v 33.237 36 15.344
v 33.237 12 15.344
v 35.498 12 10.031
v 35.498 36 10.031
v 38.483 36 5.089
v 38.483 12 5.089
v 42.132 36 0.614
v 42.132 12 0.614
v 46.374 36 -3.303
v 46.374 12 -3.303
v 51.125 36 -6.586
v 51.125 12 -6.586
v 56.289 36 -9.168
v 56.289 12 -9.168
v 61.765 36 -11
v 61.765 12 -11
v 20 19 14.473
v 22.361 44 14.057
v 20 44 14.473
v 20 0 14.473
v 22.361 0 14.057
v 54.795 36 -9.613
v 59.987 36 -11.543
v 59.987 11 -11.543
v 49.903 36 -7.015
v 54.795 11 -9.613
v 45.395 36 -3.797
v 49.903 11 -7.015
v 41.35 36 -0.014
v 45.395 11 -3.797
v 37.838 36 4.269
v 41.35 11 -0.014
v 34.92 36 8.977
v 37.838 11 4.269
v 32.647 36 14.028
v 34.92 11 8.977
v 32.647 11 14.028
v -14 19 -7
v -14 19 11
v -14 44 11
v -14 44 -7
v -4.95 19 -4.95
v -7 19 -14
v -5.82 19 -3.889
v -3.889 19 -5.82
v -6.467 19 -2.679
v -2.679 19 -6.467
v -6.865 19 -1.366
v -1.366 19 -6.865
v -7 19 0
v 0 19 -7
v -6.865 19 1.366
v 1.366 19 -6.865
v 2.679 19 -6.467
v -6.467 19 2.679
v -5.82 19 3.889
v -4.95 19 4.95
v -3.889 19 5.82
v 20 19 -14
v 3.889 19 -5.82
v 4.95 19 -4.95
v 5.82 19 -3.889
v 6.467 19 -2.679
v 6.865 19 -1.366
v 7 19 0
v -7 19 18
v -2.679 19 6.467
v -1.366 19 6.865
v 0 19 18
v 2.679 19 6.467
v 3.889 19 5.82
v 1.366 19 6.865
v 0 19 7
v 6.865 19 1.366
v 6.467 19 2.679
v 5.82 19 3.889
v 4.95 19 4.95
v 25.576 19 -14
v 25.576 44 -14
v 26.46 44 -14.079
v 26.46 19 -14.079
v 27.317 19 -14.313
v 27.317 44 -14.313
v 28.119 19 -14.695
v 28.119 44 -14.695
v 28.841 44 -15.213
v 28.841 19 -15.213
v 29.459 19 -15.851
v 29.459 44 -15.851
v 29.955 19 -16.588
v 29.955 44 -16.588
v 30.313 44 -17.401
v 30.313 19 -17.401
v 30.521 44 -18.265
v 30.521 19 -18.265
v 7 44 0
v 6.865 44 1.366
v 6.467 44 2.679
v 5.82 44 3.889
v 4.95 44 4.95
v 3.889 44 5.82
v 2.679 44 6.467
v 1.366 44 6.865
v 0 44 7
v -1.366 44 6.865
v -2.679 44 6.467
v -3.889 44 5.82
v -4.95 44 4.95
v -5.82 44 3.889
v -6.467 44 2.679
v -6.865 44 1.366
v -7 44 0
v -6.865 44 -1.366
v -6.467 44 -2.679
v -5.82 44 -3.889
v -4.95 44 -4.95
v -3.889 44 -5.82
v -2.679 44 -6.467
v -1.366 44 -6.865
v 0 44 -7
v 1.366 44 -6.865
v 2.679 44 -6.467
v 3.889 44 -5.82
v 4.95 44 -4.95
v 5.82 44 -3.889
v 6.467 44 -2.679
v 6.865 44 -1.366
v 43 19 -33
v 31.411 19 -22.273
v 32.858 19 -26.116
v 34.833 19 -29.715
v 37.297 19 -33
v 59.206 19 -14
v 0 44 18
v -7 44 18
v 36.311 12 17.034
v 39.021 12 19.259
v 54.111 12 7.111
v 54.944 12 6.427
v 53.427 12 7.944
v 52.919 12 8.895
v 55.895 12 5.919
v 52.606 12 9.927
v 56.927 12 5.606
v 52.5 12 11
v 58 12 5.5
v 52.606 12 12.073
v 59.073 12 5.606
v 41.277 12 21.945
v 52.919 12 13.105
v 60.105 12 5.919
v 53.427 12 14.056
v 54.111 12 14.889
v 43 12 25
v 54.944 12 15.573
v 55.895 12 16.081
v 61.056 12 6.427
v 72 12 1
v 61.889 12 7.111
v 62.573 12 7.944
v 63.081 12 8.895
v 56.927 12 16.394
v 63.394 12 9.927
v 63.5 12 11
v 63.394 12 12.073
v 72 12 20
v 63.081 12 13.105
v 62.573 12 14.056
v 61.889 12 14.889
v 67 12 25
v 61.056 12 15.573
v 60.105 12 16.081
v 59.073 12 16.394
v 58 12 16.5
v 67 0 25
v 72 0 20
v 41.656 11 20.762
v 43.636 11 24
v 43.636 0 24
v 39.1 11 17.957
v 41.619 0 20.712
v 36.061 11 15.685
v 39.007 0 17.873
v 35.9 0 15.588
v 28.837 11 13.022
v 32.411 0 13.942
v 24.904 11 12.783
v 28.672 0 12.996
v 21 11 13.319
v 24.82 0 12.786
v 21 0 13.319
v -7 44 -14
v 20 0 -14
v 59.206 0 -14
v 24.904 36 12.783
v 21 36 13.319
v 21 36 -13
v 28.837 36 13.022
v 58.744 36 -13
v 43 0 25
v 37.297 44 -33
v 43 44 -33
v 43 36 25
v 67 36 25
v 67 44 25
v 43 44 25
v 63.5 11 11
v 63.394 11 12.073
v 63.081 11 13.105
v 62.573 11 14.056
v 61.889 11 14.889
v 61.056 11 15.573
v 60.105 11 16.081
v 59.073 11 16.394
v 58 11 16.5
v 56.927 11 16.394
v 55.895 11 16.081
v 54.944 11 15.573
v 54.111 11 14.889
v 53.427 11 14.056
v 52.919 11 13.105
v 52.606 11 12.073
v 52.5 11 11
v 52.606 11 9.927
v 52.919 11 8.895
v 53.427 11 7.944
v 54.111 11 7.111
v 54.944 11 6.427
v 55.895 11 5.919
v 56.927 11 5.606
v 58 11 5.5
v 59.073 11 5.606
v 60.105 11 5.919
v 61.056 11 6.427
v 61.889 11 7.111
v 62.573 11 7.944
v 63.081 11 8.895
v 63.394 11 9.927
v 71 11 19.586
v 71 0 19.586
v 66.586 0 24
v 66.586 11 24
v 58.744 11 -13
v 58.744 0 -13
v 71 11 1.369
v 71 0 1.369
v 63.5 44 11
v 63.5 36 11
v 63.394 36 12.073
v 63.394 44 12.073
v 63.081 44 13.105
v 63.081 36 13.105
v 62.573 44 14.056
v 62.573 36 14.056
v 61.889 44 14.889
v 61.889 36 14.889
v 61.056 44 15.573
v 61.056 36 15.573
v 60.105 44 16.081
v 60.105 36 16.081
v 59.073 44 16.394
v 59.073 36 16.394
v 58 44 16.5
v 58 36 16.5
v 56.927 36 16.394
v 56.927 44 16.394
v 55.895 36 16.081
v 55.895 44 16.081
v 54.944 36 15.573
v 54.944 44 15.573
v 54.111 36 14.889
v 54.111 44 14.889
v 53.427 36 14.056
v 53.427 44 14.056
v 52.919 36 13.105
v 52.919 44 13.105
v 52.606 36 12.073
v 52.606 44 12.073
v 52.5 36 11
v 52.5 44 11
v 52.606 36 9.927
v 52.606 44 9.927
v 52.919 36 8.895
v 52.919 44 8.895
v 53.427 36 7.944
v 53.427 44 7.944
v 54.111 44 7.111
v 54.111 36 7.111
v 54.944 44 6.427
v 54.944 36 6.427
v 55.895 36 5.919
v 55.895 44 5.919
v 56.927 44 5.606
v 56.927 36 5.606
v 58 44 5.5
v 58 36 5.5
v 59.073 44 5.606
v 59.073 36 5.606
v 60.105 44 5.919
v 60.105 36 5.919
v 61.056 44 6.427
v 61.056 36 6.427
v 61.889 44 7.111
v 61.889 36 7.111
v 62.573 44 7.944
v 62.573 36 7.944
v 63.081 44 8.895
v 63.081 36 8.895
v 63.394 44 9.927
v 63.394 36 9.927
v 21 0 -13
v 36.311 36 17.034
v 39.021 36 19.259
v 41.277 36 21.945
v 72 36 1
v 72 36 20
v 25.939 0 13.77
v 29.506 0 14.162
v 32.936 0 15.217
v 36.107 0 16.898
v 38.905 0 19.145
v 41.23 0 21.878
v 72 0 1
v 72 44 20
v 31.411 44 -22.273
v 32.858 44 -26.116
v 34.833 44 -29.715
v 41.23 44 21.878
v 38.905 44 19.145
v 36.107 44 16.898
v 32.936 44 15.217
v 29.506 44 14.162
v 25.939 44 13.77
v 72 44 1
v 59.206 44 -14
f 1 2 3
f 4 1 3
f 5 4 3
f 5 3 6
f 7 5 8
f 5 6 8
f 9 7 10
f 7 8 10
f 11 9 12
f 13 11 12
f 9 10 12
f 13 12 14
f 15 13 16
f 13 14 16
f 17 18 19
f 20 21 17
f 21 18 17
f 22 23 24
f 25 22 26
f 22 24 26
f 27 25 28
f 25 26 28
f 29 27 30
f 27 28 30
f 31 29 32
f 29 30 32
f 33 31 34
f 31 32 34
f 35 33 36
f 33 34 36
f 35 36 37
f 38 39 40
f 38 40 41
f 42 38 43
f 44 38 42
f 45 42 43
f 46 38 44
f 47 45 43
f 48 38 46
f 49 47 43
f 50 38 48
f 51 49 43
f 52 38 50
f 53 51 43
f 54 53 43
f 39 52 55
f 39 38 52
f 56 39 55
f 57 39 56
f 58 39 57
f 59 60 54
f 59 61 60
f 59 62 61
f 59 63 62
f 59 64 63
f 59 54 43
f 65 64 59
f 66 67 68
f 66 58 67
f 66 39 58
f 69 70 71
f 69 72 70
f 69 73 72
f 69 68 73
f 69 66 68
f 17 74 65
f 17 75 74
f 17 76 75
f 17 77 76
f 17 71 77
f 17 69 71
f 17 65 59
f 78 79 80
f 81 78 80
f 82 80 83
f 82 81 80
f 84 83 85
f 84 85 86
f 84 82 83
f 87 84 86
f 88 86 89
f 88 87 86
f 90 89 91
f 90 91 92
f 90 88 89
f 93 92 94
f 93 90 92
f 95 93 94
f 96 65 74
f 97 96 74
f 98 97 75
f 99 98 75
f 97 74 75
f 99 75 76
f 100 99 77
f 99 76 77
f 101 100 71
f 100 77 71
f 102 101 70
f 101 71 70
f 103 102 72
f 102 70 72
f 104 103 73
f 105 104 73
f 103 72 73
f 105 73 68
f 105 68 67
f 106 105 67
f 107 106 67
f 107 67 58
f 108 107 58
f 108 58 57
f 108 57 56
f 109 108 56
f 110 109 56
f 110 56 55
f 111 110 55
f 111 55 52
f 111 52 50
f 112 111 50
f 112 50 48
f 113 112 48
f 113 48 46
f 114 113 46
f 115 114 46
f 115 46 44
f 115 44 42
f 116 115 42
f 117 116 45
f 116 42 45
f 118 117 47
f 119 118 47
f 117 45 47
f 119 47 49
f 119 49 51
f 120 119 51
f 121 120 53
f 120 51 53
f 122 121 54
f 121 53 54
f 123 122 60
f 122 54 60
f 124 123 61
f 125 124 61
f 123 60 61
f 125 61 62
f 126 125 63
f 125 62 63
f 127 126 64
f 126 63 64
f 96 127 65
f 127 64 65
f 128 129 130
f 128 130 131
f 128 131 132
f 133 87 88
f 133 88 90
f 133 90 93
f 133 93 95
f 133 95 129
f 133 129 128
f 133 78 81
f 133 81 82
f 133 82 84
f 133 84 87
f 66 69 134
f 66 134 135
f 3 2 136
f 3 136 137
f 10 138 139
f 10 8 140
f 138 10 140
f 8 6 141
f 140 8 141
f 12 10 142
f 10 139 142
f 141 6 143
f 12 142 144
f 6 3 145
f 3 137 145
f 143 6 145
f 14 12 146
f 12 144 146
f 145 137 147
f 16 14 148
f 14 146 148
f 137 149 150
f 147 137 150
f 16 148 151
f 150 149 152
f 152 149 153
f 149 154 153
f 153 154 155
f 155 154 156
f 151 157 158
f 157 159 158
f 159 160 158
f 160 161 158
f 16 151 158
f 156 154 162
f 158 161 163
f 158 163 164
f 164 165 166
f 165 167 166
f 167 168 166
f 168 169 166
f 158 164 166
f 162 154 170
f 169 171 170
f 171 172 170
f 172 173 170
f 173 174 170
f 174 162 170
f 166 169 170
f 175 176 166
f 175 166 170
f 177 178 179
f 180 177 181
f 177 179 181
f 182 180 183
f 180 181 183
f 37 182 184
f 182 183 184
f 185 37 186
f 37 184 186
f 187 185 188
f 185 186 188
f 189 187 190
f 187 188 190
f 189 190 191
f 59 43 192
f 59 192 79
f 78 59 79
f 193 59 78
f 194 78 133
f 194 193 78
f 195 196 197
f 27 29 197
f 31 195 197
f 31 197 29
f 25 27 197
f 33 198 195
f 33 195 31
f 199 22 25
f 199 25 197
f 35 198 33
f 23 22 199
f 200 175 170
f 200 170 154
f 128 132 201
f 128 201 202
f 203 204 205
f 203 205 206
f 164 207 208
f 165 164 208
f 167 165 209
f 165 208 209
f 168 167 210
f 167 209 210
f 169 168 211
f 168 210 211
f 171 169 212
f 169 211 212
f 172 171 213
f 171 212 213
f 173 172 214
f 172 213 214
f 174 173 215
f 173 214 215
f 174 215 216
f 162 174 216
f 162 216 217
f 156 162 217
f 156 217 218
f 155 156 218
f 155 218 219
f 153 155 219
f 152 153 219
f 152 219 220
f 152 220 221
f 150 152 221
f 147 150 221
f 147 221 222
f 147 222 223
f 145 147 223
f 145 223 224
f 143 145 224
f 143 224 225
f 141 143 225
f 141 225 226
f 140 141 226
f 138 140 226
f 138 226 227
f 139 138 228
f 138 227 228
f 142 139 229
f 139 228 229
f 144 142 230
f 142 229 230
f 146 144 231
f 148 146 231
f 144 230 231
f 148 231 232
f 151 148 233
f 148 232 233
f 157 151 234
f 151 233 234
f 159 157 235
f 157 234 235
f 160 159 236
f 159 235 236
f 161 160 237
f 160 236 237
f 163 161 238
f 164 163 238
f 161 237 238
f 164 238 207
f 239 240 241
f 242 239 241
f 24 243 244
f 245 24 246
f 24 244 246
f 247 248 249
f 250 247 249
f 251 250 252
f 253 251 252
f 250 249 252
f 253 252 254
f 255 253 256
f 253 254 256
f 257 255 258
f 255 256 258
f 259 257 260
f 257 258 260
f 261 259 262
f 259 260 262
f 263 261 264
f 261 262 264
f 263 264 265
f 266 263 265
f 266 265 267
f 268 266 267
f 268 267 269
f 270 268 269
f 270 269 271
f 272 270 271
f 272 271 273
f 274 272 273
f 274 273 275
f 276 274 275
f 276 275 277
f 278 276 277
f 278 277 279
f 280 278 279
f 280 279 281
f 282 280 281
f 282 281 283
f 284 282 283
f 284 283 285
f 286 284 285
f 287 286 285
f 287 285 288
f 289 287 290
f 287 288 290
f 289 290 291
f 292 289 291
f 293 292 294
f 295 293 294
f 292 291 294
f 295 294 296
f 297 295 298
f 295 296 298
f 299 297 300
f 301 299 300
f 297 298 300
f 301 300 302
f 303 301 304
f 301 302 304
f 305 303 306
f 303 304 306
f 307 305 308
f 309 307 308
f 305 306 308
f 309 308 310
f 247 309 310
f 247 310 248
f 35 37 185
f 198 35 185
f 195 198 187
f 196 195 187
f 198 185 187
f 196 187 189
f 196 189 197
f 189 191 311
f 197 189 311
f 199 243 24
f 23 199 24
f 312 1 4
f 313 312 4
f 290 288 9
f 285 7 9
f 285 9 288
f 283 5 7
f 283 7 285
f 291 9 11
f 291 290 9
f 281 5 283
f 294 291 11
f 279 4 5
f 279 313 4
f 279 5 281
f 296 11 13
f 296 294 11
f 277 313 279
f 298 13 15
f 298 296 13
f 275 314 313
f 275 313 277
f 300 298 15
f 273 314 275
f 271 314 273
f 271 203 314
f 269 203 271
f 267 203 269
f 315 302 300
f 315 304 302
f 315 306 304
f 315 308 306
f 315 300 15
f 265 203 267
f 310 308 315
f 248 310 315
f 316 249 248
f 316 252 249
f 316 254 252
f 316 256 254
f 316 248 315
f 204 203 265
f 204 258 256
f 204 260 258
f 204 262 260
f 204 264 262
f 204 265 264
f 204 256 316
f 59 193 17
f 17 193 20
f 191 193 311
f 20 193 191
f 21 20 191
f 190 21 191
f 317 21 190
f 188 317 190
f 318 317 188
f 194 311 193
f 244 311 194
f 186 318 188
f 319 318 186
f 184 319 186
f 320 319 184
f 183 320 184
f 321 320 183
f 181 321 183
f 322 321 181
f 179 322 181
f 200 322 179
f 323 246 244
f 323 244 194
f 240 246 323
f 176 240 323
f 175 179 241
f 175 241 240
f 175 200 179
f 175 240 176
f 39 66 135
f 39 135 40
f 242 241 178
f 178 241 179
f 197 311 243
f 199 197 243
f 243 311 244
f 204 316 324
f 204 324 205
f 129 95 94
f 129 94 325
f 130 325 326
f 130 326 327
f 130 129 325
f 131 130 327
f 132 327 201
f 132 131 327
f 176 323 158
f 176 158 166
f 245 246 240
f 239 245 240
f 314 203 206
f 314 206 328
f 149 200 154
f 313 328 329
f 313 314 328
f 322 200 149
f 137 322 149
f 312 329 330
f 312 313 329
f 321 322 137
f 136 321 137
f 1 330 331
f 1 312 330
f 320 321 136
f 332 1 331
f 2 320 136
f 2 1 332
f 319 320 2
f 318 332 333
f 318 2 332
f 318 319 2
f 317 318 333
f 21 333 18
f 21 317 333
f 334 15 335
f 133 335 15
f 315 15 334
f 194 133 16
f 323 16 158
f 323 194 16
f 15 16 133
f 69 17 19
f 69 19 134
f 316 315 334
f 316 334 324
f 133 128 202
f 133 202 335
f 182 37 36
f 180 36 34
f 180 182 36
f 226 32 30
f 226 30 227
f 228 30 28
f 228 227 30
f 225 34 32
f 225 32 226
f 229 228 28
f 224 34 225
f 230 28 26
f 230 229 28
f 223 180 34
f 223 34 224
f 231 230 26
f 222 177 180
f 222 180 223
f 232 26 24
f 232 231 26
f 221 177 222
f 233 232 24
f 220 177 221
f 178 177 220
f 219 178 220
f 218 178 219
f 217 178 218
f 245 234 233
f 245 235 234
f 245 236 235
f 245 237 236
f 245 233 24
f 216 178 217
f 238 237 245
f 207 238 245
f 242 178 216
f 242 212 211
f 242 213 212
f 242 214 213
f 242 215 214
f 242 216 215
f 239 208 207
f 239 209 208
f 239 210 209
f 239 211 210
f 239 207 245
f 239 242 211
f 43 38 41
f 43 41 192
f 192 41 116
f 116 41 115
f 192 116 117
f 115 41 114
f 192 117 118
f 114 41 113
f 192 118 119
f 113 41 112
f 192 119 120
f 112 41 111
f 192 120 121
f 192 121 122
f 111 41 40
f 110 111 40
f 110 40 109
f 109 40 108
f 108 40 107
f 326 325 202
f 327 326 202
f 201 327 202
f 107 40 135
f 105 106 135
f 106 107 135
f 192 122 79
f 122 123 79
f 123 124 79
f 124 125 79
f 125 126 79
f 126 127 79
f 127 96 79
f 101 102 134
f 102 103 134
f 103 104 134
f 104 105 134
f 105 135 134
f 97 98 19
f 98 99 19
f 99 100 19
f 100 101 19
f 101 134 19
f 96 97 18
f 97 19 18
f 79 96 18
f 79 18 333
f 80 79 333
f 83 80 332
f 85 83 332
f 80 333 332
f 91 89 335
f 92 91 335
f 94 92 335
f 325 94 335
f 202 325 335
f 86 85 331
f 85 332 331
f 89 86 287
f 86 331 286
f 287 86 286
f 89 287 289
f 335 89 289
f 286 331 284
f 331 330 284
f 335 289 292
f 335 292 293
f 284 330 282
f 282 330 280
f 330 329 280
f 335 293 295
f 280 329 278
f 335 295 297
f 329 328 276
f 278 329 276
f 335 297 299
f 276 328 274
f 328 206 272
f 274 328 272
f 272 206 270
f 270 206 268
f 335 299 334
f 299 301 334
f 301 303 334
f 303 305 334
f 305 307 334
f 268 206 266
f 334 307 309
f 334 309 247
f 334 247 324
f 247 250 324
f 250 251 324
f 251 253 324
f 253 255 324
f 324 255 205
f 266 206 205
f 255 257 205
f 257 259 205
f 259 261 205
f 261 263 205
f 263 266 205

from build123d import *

# Parameters (mm, degrees)
F0_R     = 5.5
F0_R_2   = 7
F1_DEPTH = 44
F2_DEPTH = 19
F4_R     = 41
F5_DEPTH = 24
F7_DEPTH = 11
F9_DEPTH = 25


with BuildPart() as f1:
    # F0 (on Front) → F1 (new body)
    with BuildSketch(Plane.XZ):
        with BuildLine():
            Line((20, 14.47346), (20, -14))
            Line((20, -14), (25.575539, -14))
            Line((25.575539, -14), (59.205882, -14))
            Line((59.205882, -14), (72, 1))
            Line((72, 1), (72, 20))
            Line((72, 20), (67, 25))
            Line((67, 25), (43, 25))
            ThreePointArc((43, 25), (34.561099, 15.982044), (22.361381, 14.057085))
            Line((22.361381, 14.057085), (20, 14.47346))
        make_face()
        with Locations((58, 11)):
            Circle(F0_R, mode=Mode.SUBTRACT)
        Polygon((-14, 11), (-14, -7), (-7, -14), (20, -14), (20, 14.47346), (0, 18), (-7, 18), align=None)
        Circle(F0_R_2, mode=Mode.SUBTRACT)
        with BuildLine():
            Line((59.205882, -14), (25.575539, -14))
            ThreePointArc((25.575539, -14), (28.840775, -15.213414), (30.521178, -18.264706))
            ThreePointArc((30.521178, -18.264706), (32.858008, -26.115672), (37.29698, -33))
            Line((37.29698, -33), (43, -33))
            Line((43, -33), (59.205882, -14))
        make_face()
    extrude(amount=-F1_DEPTH)

    # F0 (on Front) → F2 (cut)
    with BuildSketch(Plane.XZ):
        Polygon((-14, 11), (-14, -7), (-7, -14), (20, -14), (20, 14.47346), (0, 18), (-7, 18), align=None)
        Circle(F0_R_2, mode=Mode.SUBTRACT)
        with BuildLine():
            Line((59.205882, -14), (25.575539, -14))
            ThreePointArc((25.575539, -14), (28.840775, -15.213414), (30.521178, -18.264706))
            ThreePointArc((30.521178, -18.264706), (32.858008, -26.115672), (37.29698, -33))
            Line((37.29698, -33), (43, -33))
            Line((43, -33), (59.205882, -14))
        make_face()
    extrude(amount=-F2_DEPTH, mode=Mode.SUBTRACT)

    # F4 (on offset) → F5 (cut)
    with BuildSketch(Plane.XZ.offset(-12)):
        with Locations((72, 28.701873)):
            Circle(F4_R)
    extrude(amount=-F5_DEPTH, mode=Mode.SUBTRACT)

    # F6 (on face) → F7 (cut)
    with BuildSketch(Plane.XZ):
        with BuildLine():
            ThreePointArc((43.636085, 24), (34.195381, 14.680891), (21, 13.319065))
            Line((21, 13.319065), (21, -13))
            Line((21, -13), (58.744476, -13))
            Line((58.744476, -13), (71, 1.368545))
            Line((71, 1.368545), (71, 19.585786))
            Line((71, 19.585786), (66.585786, 24))
            Line((66.585786, 24), (43.636085, 24))
        make_face()
    extrude(amount=-F7_DEPTH, mode=Mode.SUBTRACT)

    # F8 (on face) → F9 (cut, through all)
    with BuildSketch(Plane.XZ.offset(-11)):
        with BuildLine():
            Line((58.744476, -13), (59.986848, -11.543427))
            ThreePointArc((59.986848, -11.543427), (43.310182, -1.972127), (32.646683, 14.028209))
            ThreePointArc((32.646683, 14.028209), (26.876207, 12.805403), (21, 13.319065))
            Line((21, 13.319065), (21, -13))
            Line((21, -13), (58.744476, -13))
        make_face()
    extrude(amount=-F9_DEPTH, mode=Mode.SUBTRACT)


solid = f1.part
